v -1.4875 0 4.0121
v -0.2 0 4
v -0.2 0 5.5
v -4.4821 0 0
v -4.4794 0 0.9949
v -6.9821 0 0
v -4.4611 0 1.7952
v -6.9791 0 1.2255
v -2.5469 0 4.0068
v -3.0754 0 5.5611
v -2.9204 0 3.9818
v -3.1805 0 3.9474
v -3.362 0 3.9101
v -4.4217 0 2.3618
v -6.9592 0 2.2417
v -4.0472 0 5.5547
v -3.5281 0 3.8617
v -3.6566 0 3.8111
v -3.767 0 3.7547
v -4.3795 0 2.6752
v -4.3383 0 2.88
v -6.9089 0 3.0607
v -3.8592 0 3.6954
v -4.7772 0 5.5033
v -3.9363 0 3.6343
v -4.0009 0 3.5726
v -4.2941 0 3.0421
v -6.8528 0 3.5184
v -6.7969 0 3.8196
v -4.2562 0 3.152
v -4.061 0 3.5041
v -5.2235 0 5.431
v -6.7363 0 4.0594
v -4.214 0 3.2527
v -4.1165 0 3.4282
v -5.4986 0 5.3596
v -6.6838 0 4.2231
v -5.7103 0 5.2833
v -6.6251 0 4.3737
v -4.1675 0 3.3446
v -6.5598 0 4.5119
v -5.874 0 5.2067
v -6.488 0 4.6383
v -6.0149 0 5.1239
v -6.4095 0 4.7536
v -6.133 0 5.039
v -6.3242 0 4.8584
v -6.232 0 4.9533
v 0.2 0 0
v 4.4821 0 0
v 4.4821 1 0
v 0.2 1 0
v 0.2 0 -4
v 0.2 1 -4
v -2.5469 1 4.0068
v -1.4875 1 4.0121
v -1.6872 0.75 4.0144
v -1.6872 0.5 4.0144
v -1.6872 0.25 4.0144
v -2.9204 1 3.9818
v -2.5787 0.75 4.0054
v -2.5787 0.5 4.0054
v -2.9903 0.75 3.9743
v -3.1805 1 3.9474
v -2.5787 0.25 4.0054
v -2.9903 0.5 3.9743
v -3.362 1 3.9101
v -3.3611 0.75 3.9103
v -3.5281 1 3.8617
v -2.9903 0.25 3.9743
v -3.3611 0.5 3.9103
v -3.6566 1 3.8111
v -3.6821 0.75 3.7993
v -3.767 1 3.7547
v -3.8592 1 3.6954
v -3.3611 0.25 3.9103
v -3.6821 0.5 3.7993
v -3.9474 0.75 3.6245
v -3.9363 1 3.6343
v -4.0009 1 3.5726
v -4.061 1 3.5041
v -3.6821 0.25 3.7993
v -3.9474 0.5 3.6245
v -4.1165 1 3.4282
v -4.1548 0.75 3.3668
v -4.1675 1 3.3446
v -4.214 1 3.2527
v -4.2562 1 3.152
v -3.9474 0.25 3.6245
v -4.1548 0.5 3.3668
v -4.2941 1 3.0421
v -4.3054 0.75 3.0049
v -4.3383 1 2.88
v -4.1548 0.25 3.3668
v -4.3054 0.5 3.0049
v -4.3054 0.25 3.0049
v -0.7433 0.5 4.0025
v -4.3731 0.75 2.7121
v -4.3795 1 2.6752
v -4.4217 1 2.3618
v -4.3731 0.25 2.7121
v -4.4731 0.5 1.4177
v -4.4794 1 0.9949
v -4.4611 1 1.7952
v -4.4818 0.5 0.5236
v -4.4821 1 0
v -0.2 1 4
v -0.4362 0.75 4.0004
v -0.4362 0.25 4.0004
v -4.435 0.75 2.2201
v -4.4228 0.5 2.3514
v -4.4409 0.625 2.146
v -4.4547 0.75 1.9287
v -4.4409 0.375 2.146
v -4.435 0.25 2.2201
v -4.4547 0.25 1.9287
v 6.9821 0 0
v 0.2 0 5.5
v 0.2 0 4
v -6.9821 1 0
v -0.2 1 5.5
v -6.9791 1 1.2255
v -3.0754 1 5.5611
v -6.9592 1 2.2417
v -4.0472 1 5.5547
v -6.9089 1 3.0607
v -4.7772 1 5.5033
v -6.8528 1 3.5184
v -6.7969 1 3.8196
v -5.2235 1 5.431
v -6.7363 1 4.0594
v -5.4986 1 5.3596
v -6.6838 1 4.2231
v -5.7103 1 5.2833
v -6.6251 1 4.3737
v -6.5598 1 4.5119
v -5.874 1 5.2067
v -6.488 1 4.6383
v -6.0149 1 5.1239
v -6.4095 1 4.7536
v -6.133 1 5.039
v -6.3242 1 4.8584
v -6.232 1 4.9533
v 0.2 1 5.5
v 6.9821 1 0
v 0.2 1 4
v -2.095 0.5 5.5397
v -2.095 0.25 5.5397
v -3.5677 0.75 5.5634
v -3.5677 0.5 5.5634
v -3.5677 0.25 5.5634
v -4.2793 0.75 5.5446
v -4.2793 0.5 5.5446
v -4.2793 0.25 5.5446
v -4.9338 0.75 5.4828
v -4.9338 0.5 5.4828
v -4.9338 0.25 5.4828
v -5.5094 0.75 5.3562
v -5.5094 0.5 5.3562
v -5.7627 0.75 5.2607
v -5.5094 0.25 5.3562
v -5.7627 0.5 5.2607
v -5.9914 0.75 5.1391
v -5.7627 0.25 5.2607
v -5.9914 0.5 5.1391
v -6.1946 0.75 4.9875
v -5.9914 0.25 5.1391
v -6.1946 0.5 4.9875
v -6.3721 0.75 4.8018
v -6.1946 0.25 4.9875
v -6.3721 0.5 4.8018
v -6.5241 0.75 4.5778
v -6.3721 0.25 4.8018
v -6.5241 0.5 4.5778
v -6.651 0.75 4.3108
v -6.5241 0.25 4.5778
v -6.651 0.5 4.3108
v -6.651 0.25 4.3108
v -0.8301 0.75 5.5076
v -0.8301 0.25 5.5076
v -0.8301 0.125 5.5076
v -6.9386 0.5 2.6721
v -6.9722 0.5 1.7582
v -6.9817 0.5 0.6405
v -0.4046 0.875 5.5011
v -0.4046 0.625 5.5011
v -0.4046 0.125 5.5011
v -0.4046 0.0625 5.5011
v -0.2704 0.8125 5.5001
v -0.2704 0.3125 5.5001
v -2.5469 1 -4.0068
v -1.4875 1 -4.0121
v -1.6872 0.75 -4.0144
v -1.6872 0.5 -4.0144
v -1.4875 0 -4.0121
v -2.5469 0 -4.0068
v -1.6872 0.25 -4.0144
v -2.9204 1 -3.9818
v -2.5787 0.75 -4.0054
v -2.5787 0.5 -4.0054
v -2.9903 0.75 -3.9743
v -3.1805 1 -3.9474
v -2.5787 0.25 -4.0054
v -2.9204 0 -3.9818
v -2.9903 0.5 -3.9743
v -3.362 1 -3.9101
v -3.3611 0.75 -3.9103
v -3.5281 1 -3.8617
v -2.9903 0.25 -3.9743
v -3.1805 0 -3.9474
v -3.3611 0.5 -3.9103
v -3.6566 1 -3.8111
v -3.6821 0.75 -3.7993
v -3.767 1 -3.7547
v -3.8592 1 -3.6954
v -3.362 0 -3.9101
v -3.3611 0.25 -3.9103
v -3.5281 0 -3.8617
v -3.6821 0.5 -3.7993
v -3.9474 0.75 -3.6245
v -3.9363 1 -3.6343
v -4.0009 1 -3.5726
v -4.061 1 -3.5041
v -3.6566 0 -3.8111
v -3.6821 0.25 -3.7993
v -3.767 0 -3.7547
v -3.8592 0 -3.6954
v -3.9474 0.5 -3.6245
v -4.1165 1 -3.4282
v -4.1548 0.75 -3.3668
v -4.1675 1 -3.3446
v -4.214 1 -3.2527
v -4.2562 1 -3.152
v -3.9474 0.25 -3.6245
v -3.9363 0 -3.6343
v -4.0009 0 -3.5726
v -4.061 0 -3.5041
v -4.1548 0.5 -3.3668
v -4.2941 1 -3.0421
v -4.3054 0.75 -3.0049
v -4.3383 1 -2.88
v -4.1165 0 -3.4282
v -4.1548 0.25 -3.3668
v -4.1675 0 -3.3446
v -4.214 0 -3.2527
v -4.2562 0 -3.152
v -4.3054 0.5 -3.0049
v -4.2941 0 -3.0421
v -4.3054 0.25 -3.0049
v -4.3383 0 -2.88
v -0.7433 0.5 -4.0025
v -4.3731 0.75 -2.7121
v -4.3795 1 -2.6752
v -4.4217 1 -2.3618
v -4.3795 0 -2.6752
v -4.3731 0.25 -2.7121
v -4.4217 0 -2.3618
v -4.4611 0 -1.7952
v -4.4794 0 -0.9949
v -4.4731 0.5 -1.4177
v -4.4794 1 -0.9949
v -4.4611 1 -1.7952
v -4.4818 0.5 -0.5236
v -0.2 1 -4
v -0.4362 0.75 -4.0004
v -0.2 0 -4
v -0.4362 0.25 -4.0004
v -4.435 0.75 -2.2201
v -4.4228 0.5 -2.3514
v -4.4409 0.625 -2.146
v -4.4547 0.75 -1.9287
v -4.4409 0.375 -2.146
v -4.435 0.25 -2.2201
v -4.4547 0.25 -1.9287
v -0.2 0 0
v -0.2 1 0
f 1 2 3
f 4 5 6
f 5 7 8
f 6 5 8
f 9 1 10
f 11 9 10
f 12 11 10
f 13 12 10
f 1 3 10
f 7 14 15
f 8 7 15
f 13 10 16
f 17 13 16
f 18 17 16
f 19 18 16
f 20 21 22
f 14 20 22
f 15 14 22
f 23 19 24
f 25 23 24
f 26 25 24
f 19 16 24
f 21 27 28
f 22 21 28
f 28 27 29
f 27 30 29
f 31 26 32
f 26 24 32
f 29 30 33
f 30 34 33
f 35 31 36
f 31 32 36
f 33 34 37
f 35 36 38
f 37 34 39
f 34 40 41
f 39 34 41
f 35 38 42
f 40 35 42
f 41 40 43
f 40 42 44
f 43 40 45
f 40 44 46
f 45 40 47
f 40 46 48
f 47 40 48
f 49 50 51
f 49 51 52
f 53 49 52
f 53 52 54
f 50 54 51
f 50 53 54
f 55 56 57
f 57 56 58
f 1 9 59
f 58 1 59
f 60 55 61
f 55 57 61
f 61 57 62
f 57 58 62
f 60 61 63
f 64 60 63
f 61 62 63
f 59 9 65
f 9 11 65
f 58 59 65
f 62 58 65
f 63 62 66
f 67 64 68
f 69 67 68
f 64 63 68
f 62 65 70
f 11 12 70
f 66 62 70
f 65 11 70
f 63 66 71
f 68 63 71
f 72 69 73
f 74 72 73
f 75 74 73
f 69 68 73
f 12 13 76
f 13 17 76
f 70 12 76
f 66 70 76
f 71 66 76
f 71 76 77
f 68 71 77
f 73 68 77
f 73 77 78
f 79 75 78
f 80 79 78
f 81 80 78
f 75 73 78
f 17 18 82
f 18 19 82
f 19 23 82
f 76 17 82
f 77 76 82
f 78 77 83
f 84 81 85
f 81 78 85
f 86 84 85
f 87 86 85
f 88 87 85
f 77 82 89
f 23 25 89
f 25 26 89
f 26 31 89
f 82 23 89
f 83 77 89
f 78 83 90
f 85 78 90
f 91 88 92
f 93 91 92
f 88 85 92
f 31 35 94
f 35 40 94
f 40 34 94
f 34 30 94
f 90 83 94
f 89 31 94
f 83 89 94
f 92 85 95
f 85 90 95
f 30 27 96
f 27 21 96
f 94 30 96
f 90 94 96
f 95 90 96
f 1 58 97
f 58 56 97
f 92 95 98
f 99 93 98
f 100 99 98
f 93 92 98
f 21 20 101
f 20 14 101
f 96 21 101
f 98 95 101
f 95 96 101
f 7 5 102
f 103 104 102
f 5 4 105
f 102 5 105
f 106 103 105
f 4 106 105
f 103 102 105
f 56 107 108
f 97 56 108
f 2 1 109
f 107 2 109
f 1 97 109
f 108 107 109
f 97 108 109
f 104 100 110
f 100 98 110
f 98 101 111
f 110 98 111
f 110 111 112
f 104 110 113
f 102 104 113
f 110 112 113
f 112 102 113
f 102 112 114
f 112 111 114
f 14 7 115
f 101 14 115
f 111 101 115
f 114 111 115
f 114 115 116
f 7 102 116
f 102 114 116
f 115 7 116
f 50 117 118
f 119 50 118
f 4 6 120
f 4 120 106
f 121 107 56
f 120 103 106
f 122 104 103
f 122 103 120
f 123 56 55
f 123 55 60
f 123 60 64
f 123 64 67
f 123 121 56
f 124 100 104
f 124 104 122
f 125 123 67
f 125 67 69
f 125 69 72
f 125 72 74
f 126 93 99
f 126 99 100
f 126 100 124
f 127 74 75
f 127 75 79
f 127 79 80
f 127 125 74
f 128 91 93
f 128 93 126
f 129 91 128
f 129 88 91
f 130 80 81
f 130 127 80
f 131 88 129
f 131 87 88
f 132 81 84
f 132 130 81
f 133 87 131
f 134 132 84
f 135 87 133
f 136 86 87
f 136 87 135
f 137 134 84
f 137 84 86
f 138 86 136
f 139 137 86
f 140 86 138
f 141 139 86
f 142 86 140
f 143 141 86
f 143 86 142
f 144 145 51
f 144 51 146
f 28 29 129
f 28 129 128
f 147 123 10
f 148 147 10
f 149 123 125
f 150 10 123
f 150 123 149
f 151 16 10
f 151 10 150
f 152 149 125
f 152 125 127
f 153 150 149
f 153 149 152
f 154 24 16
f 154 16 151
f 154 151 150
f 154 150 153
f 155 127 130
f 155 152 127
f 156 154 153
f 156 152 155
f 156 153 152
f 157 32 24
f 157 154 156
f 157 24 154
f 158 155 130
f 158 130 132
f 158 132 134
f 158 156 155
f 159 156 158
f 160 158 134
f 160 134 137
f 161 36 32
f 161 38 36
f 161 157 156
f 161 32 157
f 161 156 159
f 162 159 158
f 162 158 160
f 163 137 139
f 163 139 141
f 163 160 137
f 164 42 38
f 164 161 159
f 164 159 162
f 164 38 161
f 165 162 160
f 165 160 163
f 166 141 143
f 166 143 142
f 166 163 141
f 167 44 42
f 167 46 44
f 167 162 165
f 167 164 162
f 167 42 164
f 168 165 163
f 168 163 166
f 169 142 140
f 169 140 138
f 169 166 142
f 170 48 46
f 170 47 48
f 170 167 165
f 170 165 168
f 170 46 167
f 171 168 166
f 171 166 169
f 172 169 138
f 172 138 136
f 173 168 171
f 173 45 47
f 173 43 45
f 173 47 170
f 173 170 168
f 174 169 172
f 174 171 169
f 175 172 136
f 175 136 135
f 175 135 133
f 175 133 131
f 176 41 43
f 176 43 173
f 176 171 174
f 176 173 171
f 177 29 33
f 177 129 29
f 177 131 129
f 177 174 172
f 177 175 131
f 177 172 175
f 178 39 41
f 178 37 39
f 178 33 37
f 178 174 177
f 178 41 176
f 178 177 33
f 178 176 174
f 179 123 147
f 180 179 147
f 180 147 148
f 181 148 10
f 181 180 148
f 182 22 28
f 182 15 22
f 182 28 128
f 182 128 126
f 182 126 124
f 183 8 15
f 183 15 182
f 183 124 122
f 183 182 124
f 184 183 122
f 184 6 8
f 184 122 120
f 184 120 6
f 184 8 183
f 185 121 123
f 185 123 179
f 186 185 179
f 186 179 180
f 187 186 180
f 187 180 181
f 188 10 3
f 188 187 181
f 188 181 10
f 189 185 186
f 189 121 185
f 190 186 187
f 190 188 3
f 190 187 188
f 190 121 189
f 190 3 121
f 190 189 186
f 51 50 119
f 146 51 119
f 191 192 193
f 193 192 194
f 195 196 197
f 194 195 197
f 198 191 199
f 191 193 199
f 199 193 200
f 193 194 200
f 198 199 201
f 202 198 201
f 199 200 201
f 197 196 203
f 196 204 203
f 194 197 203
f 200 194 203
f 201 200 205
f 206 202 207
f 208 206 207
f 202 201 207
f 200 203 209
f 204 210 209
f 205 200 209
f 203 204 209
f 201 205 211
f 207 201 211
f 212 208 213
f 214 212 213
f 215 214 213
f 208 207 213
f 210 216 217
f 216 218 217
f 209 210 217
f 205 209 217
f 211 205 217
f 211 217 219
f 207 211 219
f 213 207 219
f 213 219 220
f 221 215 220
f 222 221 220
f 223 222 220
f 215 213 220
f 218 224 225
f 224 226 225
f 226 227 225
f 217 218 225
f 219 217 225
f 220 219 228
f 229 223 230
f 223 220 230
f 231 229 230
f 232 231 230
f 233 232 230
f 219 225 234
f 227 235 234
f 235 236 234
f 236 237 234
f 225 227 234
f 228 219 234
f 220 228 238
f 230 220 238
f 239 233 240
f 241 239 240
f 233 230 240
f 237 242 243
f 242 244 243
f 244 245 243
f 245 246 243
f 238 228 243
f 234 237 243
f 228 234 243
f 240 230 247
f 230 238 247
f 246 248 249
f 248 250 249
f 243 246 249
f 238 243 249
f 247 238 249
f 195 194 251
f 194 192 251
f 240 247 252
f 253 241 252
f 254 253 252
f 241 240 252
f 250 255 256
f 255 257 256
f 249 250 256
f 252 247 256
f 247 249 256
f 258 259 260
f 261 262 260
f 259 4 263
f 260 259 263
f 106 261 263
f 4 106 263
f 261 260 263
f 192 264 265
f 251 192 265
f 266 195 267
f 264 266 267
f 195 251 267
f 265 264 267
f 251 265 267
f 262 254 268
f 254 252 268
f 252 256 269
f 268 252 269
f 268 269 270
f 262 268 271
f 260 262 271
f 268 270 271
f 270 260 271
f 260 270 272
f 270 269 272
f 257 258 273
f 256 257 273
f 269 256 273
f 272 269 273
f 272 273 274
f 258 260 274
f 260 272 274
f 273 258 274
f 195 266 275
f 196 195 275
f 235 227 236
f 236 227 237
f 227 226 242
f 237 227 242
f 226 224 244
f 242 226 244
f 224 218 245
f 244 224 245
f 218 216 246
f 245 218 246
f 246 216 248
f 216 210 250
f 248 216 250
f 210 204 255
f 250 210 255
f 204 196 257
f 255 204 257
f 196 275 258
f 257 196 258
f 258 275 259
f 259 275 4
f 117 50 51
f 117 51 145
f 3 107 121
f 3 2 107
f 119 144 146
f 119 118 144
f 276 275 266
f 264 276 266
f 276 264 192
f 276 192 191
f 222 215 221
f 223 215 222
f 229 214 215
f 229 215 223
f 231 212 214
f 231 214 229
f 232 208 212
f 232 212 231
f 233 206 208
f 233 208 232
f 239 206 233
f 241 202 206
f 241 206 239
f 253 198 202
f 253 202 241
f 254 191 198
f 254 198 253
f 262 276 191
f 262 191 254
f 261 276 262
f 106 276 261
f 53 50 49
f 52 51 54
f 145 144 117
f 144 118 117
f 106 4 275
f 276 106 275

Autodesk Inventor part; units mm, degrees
ref_plane "YZ Plane" through (0, 0, 0) normal (1, 0, 0) x (0, 1, 0)
ref_plane "XZ Plane" through (0, 0, 0) normal (0, 1, 0) x (-1, 0, 0)
ref_plane "XY Plane" through (0, 0, 0) normal (0, 0, 1) x (1, 0, 0)
sketch "Sketch1" plane through (0, 0, 0) normal (0, 1, 0) x (-1, 0, 0)
  line L0 (6.9821, 0) -> (4.4821, 0)
  line L1 (0.2, 4) -> (0.2, 5.5)
  line L2 (-4.4821, 0) -> (-6.9821, 0)
  line L3 (-0.2, 5.5) -> (-0.2, 4)
  line L4 (-10.1992, 0) -> (12.3203, 0) construction
  line L5 (0, -41.6633) -> (0, 16.1649) construction
  line L6 (0.2, 5.5) -> (0.4844, 5.5) construction
  line L7 (0.4844, 5.5) -> (6.9821, 5.5) construction
  line L8 (6.9821, 5.5) -> (6.9821, 6.8061) construction
  line L9 (6.9821, 6.8061) -> (6.9821, 0) construction
  spline S0 degree 4 poles (0.2, 5.5) (0.4844, 5.5) (6.9821, 5.5) (6.9821, 6.8061) (6.9821, 0) knots 1 1 1 1 1 2 2 2 2 2
  line L10 (0.2, 4) -> (1.0687, 4) construction
  line L11 (1.0687, 4) -> (4.4821, 4) construction
  line L12 (4.4821, 4) -> (4.4821, 4.6412) construction
  line L13 (4.4821, 4.6412) -> (4.4821, 0) construction
  spline S1 degree 4 poles (0.2, 4) (1.0687, 4) (4.4821, 4) (4.4821, 4.6412) (4.4821, 0) knots 1 1 1 1 1 2 2 2 2 2
  line L14 (0.2, 4) -> (-0.2, 4) construction
  line L15 (-0.2, 5.5) -> (-6.9821, 0)
  line L16 (4.4821, 0) -> (0.2, 0)
  line L17 (-4.4821, 0) -> (-0.2, 0)
  line L18 (-0.2, 0) -> (-0.2, -4)
  line L19 (-0.2, -4) -> (-4.4821, 0)
  line L20 (0.2, -4) -> (1.0687, -4) construction
  line L21 (1.0687, -4) -> (4.4821, -4) construction
  line L22 (4.4821, -4) -> (4.4821, -4.6412) construction
  line L23 (4.4821, -4.6412) -> (4.4821, 0) construction
  spline S2 degree 4 poles (0.2, -4) (1.0687, -4) (4.4821, -4) (4.4821, -4.6412) (4.4821, 0) knots 1 1 1 1 1 2 2 2 2 2
  line L24 (0.2, 0) -> (0.2, -4)
  line L25 (-0.2, -4) -> (0.2, -4) construction
  line L26 (-4.4821, 0) -> (-0.2, 4)
  point P0 (0, 0)
  dimension "d0" = 0.2
  dimension "d1" = 4
  dimension "d3" = 2.5
  dimension "d6" = 1.5
extrude "Extrusion1" add sketch "Sketch1" along normal blind 1
sketch "Sketch2" plane through (0, 0, 0) normal (0, 1, 0) x (-1, 0, 0)
  line L0 (0, -40.0826) -> (0, 6.6804) construction
  line L1 (-5.6893, 0) -> (7.9729, 0) construction
  spline S0 degree 4 poles (5.7309, -9.156) (6.4153, -8.9173) (4.9983, -7.4481) (5.0462, -8.6728) (4.0888, -9.5797) (3.7167, -8.7652) (3.7309, -8.156) knots 0 0 0 0 0 0.475399 0.676528 1 1 1 1 1
  line L2 (3.7203, -8.6135) -> (3.7416, -7.6985) construction
  arc A0 (3.7712, -7.7964) -> (3.7544, -8.5171) centre (5.7845, -8.2039) ccw construction
  point P0 (0, 0)
  point P1 (2.7309, -8.156)
  point P2 (2.7309, -9.156)
  point P3 (3.7309, -9.156)
  point P4 (4.7309, -8.156)
  point P5 (4.7309, -9.156)
  point P6 (5.7309, -8.156)
  point P7 (2.7309, -10.156)
  point P8 (3.7309, -10.156)
  point P9 (4.7309, -10.156)
  point P10 (5.7309, -10.156)
  point P11 (2.7309, -11.156)
  point P12 (3.7309, -11.156)
  point P13 (4.7309, -11.156)
  point P14 (5.7309, -11.156)
  point P15 (2.7309, -12.156)
  point P16 (3.7309, -12.156)
  point P17 (4.7309, -12.156)
  point P18 (5.7309, -12.156)
  point P19 (2.7309, -13.156)
  point P20 (3.7309, -13.156)
  point P21 (4.7309, -13.156)
  point P22 (5.7309, -13.156)
  point P23 (2.7309, -14.156)
  point P24 (3.7309, -14.156)
  point P25 (4.7309, -14.156)
  point P26 (5.7309, -14.156)
  point P27 (2.7309, -15.156)
  point P28 (3.7309, -15.156)
  point P29 (4.7309, -15.156)
  point P30 (5.7309, -15.156)
  point P31 (2.7309, -16.156)
  point P32 (3.7309, -16.156)
  point P33 (4.7309, -16.156)
  point P34 (5.7309, -16.156)
  point P35 (2.7309, -17.156)
  point P36 (3.7309, -17.156)
  point P37 (4.7309, -17.156)
  point P38 (5.7309, -17.156)
  point P39 (2.7309, -18.156)
  point P40 (3.7309, -18.156)
  point P41 (4.7309, -18.156)
  point P42 (5.7309, -18.156)
  point P43 (2.7309, -19.156)
  point P44 (3.7309, -19.156)
  point P45 (4.7309, -19.156)
  point P46 (5.7309, -19.156)
  point P47 (2.7309, -20.156)
  point P48 (3.7309, -20.156)
  point P49 (4.7309, -20.156)
  point P50 (5.7309, -20.156)
  point P51 (2.7309, -21.156)
  point P52 (3.7309, -21.156)
  point P53 (4.7309, -21.156)
  point P54 (5.7309, -21.156)
  point P55 (2.7309, -22.156)
  point P56 (3.7309, -22.156)
  point P57 (4.7309, -22.156)
  point P58 (5.7309, -22.156)
  point P59 (2.7309, -23.156)
  point P60 (3.7309, -23.156)
  point P61 (4.7309, -23.156)
  point P62 (5.7309, -23.156)
  point P63 (2.7309, -24.156)
  point P64 (3.7309, -24.156)
  point P65 (4.7309, -24.156)
  point P66 (5.7309, -24.156)
  point P67 (2.7309, -25.156)
  point P68 (3.7309, -25.156)
  point P69 (4.7309, -25.156)
  point P70 (5.7309, -25.156)
  point P71 (2.7309, -26.156)
  point P72 (3.7309, -26.156)
  point P73 (4.7309, -26.156)
  point P74 (5.7309, -26.156)
  point P75 (2.7309, -27.156)
  point P76 (3.7309, -27.156)
  point P77 (4.7309, -27.156)
  point P78 (5.7309, -27.156)
  point P79 (2.7309, -28.156)
  point P80 (3.7309, -28.156)
  point P81 (4.7309, -28.156)
  point P82 (5.7309, -28.156)
  point P83 (5.7309, -8.4151)
  point P84 (5.1242, -8.156)
  point P85 (4.7309, -8.7206)
  point P86 (4.2129, -9.1858)
  point P87 (5.6724, -8.9882)
  point P88 (3.5533, -8.1518)
  dimension "d9" = 1
  dimension "d12" = 1
sketch "Sketch3" plane through (0, 0, 0) normal (0, 1, 0) x (-1, 0, 0)
  line L0 (1.8486, -7.6205) -> (1.8486, -33.4021) construction
  line L1 (1.8486, -33.4021) -> (-3.7375, -33.4021) construction
  line L2 (-3.7375, -33.4021) -> (-3.7375, -7.6205) construction
  line L3 (-3.7375, -7.6205) -> (1.8486, -7.6205) construction
  point P0 (0, 0)
properties part number "Systemic_Logo"
